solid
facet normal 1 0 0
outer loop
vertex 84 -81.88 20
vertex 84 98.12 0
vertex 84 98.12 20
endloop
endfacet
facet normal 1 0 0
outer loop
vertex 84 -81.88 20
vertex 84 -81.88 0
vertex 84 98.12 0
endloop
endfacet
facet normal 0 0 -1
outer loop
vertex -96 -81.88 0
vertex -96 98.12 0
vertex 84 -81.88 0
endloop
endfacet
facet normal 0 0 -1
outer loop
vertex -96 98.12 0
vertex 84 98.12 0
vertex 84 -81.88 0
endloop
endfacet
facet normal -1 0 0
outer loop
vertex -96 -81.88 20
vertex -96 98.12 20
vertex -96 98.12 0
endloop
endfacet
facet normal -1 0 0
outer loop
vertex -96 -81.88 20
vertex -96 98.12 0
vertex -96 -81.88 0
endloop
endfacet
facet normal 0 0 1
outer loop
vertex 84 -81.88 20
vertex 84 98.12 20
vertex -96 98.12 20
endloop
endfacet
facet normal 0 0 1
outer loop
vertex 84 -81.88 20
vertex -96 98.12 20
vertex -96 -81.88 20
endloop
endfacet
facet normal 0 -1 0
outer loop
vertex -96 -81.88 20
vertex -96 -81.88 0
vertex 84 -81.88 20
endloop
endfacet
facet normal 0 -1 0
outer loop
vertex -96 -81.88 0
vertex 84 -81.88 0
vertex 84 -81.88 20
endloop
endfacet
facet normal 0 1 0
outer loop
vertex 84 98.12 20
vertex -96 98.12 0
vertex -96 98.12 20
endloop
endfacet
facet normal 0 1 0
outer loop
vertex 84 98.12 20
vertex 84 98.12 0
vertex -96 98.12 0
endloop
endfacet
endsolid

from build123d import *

# Parameters (mm, degrees)
F0_W      = 168
F0_H      = 168
F1_DEPTH  = 20
F1_FACE_W = 168
F1_FACE_H = 20
F2_DEPTH  = 12
F2_FACE_W = 180
F2_FACE_H = 20
F3_DEPTH  = 12


with BuildPart() as f1:
    # F0 (on Top) → F1 (new body)
    with BuildSketch(Plane.XY):
        with Locations((-2e-06, 2.119795)):
            Rectangle(F0_W, F0_H)
    extrude(amount=F1_DEPTH)

    # F1_face (on face) → F2 (join)
    with BuildSketch(Plane(origin=(-2e-06, 86.119795, 10), x_dir=(-1, 0, 0), z_dir=(0, 1, 0))):
        Rectangle(F1_FACE_W, F1_FACE_H)
    extrude(amount=F2_DEPTH)

    # F2_face (on face) → F3 (join)
    with BuildSketch(Plane(origin=(-84.000002, 8.119795, 10), x_dir=(0, -1, 0), z_dir=(-1, 0, 0))):
        Rectangle(F2_FACE_W, F2_FACE_H)
    extrude(amount=F3_DEPTH)


solid = f1.part
